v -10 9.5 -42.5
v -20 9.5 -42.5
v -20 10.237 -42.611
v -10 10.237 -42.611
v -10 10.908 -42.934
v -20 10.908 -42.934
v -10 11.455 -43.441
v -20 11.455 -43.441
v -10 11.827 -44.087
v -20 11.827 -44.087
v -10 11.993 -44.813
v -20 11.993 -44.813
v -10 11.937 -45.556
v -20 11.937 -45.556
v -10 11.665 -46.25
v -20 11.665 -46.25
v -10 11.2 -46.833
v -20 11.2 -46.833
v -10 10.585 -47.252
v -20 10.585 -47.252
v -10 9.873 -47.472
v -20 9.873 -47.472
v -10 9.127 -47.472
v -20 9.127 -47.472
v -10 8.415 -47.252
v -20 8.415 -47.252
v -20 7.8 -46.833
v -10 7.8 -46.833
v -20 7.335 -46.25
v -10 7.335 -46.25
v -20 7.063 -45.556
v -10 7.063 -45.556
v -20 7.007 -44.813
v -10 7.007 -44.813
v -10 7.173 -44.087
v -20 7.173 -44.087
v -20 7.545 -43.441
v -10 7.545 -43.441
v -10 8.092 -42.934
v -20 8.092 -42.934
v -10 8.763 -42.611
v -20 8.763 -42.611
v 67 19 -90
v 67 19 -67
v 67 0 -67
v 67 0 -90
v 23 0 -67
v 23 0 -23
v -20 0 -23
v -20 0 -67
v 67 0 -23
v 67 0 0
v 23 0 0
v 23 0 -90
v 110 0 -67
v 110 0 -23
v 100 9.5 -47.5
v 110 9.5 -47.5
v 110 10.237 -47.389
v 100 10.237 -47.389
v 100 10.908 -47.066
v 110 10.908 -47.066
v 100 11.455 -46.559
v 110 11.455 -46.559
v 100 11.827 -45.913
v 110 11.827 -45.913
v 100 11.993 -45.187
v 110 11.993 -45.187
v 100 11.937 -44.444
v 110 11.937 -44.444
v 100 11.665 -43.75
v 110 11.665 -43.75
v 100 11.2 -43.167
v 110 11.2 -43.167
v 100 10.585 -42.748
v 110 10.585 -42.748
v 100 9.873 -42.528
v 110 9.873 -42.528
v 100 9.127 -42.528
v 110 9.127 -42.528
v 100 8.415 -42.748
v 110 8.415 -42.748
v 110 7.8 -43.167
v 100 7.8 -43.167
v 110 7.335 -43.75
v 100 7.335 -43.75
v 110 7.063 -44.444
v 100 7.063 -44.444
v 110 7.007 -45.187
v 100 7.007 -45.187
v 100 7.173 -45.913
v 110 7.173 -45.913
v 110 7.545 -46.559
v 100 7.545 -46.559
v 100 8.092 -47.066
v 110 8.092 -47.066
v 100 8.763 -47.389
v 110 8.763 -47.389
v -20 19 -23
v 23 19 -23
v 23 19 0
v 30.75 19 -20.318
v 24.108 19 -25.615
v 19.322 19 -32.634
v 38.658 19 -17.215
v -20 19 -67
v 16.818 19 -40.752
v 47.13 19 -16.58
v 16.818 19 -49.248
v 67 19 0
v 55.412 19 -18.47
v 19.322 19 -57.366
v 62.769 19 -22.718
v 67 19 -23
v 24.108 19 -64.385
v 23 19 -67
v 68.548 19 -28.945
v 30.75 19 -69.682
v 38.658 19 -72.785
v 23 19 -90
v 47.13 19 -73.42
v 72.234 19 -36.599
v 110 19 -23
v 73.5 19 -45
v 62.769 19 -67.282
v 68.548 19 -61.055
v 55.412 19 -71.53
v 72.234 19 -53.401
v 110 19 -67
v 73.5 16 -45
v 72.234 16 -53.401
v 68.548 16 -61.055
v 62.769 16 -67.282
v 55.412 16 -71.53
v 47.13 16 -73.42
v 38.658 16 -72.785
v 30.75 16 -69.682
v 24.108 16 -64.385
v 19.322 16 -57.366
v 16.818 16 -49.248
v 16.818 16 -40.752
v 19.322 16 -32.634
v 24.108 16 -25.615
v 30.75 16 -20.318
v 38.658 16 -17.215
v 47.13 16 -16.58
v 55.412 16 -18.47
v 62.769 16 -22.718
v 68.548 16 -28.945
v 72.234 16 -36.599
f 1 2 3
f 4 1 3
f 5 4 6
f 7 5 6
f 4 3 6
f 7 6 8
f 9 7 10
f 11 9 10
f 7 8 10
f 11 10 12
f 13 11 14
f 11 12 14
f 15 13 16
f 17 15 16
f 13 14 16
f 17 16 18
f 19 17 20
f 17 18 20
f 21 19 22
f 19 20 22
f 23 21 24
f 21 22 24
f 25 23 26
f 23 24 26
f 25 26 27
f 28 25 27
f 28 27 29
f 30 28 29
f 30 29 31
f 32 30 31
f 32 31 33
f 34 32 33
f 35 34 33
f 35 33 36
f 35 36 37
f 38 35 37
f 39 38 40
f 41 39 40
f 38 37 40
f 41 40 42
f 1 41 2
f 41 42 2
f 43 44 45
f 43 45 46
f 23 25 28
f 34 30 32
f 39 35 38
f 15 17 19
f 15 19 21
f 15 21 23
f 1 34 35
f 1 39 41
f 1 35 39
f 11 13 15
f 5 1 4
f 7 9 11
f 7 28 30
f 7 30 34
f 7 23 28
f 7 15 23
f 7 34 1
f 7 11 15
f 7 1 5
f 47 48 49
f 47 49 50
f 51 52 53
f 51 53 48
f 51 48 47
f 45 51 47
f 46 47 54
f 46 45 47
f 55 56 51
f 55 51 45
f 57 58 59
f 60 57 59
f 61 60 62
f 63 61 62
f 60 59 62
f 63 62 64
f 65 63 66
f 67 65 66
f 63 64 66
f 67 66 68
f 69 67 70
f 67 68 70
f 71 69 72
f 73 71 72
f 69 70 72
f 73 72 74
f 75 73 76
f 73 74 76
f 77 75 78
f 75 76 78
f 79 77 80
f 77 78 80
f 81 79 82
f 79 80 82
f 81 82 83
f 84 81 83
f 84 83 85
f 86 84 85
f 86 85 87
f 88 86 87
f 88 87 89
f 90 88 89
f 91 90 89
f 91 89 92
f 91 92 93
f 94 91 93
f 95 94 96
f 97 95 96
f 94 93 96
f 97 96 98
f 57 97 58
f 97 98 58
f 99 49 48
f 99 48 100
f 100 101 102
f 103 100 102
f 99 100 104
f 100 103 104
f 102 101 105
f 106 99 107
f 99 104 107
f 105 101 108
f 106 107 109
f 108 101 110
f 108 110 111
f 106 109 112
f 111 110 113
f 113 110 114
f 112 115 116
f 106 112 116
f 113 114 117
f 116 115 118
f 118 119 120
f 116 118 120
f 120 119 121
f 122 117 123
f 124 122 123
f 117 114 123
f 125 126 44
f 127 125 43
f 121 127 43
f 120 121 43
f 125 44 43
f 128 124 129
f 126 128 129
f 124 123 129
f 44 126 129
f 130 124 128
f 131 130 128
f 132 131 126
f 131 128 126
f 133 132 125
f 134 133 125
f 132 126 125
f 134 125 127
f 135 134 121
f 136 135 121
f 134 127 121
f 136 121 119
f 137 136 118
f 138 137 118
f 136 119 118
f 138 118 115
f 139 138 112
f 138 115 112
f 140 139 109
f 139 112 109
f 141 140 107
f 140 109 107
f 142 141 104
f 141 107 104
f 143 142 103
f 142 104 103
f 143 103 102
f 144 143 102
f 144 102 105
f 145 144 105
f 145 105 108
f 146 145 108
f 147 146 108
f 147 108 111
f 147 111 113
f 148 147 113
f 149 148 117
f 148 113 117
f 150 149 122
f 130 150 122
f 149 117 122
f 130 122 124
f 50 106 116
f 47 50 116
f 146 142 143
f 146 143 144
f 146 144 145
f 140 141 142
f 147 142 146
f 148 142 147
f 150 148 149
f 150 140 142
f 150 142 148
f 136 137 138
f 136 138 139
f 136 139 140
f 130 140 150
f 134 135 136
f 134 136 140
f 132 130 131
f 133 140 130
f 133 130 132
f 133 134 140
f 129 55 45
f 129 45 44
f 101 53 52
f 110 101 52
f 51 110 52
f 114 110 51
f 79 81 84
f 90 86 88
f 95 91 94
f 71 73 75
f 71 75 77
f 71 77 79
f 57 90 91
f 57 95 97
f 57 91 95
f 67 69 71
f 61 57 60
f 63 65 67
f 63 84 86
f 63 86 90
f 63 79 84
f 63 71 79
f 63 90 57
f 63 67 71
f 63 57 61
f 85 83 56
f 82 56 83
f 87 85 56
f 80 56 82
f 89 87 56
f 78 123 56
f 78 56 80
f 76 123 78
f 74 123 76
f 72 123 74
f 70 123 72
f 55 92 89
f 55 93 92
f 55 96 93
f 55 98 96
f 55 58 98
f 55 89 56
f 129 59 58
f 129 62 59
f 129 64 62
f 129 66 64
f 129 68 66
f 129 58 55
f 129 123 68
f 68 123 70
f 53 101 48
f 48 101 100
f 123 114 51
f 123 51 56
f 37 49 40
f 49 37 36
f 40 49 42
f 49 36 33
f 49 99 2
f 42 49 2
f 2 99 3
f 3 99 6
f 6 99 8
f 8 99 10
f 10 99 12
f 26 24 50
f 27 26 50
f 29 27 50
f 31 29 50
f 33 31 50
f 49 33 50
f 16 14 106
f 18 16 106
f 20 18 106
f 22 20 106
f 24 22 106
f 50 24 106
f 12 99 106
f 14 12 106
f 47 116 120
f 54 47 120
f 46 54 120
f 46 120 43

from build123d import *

# Parameters (mm, degrees)
SKETCH1_W           = 90
SKETCH1_H           = 90
BOSS_EXTRUDE1_DEPTH = 19
SKETCH9_W           = 44
SKETCH9_H           = 19
BOSS_EXTRUDE2_DEPTH = 65
SKETCH2_R           = 28.5
CUT_EXTRUDE1_DEPTH  = 3
SKETCH4_W           = 23
SKETCH4_H           = 23
CUT_EXTRUDE3_DEPTH  = 144.391073641
SKETCH11_R          = 2.5
CUT_EXTRUDE4_DEPTH  = 10
CUT_EXTRUDE5_START  = -10
SKETCH12_R          = 2.5
CUT_EXTRUDE5_DEPTH  = 10


with BuildPart() as part:
    # Sketch1 → Boss-Extrude1 (new body)
    with BuildSketch(Plane(origin=(0, 0, 0), x_dir=(1, 0, 0), z_dir=(0, 1, 0))):
        with Locations((45, 45)):
            Rectangle(SKETCH1_W, SKETCH1_H)
    extrude(amount=BOSS_EXTRUDE1_DEPTH)

    # Sketch9 → Boss-Extrude2 (add, symmetric)
    with BuildSketch(Plane(origin=(45, 0, 0), x_dir=(0, 0, -1), z_dir=(1, 0, 0))):
        with Locations((45, 9.5)):
            Rectangle(SKETCH9_W, SKETCH9_H)
    extrude(amount=BOSS_EXTRUDE2_DEPTH, both=True)

    # Sketch2 → Cut-Extrude1 (cut)
    with BuildSketch(Plane(origin=(0, 19, 0), x_dir=(1, 0, 0), z_dir=(0, 1, 0))):
        with Locations((45, 45)):
            Circle(SKETCH2_R)
    extrude(amount=-CUT_EXTRUDE1_DEPTH, mode=Mode.SUBTRACT)

    # Sketch4 → Cut-Extrude3 (cut, through all)
    with BuildSketch(Plane(origin=(0, 19, 0), x_dir=(1, 0, 0), z_dir=(0, 1, 0))):
        with Locations((11.5, 11.5)):
            Rectangle(SKETCH4_W, SKETCH4_H)
        with Locations((11.5, 78.5)):
            Rectangle(SKETCH4_W, SKETCH4_H)
        with Locations((78.5, 78.5)):
            Rectangle(SKETCH4_W, SKETCH4_H)
        with Locations((78.5, 11.5)):
            Rectangle(SKETCH4_W, SKETCH4_H)
    extrude(amount=-CUT_EXTRUDE3_DEPTH, mode=Mode.SUBTRACT)

    # Sketch11 → Cut-Extrude4 (cut)
    with BuildSketch(Plane(origin=(110, 0, 0), x_dir=(0, 0, -1), z_dir=(1, 0, 0))):
        with Locations((45, 9.5)):
            Circle(SKETCH11_R)
    extrude(amount=-CUT_EXTRUDE4_DEPTH, mode=Mode.SUBTRACT)

    # Sketch12 → Cut-Extrude5 (cut)
    with BuildSketch(Plane.ZY.offset(20).offset(CUT_EXTRUDE5_START)):
        with Locations((-45, 9.5)):
            Circle(SKETCH12_R)
    extrude(amount=CUT_EXTRUDE5_DEPTH, mode=Mode.SUBTRACT)


solid = part.part
